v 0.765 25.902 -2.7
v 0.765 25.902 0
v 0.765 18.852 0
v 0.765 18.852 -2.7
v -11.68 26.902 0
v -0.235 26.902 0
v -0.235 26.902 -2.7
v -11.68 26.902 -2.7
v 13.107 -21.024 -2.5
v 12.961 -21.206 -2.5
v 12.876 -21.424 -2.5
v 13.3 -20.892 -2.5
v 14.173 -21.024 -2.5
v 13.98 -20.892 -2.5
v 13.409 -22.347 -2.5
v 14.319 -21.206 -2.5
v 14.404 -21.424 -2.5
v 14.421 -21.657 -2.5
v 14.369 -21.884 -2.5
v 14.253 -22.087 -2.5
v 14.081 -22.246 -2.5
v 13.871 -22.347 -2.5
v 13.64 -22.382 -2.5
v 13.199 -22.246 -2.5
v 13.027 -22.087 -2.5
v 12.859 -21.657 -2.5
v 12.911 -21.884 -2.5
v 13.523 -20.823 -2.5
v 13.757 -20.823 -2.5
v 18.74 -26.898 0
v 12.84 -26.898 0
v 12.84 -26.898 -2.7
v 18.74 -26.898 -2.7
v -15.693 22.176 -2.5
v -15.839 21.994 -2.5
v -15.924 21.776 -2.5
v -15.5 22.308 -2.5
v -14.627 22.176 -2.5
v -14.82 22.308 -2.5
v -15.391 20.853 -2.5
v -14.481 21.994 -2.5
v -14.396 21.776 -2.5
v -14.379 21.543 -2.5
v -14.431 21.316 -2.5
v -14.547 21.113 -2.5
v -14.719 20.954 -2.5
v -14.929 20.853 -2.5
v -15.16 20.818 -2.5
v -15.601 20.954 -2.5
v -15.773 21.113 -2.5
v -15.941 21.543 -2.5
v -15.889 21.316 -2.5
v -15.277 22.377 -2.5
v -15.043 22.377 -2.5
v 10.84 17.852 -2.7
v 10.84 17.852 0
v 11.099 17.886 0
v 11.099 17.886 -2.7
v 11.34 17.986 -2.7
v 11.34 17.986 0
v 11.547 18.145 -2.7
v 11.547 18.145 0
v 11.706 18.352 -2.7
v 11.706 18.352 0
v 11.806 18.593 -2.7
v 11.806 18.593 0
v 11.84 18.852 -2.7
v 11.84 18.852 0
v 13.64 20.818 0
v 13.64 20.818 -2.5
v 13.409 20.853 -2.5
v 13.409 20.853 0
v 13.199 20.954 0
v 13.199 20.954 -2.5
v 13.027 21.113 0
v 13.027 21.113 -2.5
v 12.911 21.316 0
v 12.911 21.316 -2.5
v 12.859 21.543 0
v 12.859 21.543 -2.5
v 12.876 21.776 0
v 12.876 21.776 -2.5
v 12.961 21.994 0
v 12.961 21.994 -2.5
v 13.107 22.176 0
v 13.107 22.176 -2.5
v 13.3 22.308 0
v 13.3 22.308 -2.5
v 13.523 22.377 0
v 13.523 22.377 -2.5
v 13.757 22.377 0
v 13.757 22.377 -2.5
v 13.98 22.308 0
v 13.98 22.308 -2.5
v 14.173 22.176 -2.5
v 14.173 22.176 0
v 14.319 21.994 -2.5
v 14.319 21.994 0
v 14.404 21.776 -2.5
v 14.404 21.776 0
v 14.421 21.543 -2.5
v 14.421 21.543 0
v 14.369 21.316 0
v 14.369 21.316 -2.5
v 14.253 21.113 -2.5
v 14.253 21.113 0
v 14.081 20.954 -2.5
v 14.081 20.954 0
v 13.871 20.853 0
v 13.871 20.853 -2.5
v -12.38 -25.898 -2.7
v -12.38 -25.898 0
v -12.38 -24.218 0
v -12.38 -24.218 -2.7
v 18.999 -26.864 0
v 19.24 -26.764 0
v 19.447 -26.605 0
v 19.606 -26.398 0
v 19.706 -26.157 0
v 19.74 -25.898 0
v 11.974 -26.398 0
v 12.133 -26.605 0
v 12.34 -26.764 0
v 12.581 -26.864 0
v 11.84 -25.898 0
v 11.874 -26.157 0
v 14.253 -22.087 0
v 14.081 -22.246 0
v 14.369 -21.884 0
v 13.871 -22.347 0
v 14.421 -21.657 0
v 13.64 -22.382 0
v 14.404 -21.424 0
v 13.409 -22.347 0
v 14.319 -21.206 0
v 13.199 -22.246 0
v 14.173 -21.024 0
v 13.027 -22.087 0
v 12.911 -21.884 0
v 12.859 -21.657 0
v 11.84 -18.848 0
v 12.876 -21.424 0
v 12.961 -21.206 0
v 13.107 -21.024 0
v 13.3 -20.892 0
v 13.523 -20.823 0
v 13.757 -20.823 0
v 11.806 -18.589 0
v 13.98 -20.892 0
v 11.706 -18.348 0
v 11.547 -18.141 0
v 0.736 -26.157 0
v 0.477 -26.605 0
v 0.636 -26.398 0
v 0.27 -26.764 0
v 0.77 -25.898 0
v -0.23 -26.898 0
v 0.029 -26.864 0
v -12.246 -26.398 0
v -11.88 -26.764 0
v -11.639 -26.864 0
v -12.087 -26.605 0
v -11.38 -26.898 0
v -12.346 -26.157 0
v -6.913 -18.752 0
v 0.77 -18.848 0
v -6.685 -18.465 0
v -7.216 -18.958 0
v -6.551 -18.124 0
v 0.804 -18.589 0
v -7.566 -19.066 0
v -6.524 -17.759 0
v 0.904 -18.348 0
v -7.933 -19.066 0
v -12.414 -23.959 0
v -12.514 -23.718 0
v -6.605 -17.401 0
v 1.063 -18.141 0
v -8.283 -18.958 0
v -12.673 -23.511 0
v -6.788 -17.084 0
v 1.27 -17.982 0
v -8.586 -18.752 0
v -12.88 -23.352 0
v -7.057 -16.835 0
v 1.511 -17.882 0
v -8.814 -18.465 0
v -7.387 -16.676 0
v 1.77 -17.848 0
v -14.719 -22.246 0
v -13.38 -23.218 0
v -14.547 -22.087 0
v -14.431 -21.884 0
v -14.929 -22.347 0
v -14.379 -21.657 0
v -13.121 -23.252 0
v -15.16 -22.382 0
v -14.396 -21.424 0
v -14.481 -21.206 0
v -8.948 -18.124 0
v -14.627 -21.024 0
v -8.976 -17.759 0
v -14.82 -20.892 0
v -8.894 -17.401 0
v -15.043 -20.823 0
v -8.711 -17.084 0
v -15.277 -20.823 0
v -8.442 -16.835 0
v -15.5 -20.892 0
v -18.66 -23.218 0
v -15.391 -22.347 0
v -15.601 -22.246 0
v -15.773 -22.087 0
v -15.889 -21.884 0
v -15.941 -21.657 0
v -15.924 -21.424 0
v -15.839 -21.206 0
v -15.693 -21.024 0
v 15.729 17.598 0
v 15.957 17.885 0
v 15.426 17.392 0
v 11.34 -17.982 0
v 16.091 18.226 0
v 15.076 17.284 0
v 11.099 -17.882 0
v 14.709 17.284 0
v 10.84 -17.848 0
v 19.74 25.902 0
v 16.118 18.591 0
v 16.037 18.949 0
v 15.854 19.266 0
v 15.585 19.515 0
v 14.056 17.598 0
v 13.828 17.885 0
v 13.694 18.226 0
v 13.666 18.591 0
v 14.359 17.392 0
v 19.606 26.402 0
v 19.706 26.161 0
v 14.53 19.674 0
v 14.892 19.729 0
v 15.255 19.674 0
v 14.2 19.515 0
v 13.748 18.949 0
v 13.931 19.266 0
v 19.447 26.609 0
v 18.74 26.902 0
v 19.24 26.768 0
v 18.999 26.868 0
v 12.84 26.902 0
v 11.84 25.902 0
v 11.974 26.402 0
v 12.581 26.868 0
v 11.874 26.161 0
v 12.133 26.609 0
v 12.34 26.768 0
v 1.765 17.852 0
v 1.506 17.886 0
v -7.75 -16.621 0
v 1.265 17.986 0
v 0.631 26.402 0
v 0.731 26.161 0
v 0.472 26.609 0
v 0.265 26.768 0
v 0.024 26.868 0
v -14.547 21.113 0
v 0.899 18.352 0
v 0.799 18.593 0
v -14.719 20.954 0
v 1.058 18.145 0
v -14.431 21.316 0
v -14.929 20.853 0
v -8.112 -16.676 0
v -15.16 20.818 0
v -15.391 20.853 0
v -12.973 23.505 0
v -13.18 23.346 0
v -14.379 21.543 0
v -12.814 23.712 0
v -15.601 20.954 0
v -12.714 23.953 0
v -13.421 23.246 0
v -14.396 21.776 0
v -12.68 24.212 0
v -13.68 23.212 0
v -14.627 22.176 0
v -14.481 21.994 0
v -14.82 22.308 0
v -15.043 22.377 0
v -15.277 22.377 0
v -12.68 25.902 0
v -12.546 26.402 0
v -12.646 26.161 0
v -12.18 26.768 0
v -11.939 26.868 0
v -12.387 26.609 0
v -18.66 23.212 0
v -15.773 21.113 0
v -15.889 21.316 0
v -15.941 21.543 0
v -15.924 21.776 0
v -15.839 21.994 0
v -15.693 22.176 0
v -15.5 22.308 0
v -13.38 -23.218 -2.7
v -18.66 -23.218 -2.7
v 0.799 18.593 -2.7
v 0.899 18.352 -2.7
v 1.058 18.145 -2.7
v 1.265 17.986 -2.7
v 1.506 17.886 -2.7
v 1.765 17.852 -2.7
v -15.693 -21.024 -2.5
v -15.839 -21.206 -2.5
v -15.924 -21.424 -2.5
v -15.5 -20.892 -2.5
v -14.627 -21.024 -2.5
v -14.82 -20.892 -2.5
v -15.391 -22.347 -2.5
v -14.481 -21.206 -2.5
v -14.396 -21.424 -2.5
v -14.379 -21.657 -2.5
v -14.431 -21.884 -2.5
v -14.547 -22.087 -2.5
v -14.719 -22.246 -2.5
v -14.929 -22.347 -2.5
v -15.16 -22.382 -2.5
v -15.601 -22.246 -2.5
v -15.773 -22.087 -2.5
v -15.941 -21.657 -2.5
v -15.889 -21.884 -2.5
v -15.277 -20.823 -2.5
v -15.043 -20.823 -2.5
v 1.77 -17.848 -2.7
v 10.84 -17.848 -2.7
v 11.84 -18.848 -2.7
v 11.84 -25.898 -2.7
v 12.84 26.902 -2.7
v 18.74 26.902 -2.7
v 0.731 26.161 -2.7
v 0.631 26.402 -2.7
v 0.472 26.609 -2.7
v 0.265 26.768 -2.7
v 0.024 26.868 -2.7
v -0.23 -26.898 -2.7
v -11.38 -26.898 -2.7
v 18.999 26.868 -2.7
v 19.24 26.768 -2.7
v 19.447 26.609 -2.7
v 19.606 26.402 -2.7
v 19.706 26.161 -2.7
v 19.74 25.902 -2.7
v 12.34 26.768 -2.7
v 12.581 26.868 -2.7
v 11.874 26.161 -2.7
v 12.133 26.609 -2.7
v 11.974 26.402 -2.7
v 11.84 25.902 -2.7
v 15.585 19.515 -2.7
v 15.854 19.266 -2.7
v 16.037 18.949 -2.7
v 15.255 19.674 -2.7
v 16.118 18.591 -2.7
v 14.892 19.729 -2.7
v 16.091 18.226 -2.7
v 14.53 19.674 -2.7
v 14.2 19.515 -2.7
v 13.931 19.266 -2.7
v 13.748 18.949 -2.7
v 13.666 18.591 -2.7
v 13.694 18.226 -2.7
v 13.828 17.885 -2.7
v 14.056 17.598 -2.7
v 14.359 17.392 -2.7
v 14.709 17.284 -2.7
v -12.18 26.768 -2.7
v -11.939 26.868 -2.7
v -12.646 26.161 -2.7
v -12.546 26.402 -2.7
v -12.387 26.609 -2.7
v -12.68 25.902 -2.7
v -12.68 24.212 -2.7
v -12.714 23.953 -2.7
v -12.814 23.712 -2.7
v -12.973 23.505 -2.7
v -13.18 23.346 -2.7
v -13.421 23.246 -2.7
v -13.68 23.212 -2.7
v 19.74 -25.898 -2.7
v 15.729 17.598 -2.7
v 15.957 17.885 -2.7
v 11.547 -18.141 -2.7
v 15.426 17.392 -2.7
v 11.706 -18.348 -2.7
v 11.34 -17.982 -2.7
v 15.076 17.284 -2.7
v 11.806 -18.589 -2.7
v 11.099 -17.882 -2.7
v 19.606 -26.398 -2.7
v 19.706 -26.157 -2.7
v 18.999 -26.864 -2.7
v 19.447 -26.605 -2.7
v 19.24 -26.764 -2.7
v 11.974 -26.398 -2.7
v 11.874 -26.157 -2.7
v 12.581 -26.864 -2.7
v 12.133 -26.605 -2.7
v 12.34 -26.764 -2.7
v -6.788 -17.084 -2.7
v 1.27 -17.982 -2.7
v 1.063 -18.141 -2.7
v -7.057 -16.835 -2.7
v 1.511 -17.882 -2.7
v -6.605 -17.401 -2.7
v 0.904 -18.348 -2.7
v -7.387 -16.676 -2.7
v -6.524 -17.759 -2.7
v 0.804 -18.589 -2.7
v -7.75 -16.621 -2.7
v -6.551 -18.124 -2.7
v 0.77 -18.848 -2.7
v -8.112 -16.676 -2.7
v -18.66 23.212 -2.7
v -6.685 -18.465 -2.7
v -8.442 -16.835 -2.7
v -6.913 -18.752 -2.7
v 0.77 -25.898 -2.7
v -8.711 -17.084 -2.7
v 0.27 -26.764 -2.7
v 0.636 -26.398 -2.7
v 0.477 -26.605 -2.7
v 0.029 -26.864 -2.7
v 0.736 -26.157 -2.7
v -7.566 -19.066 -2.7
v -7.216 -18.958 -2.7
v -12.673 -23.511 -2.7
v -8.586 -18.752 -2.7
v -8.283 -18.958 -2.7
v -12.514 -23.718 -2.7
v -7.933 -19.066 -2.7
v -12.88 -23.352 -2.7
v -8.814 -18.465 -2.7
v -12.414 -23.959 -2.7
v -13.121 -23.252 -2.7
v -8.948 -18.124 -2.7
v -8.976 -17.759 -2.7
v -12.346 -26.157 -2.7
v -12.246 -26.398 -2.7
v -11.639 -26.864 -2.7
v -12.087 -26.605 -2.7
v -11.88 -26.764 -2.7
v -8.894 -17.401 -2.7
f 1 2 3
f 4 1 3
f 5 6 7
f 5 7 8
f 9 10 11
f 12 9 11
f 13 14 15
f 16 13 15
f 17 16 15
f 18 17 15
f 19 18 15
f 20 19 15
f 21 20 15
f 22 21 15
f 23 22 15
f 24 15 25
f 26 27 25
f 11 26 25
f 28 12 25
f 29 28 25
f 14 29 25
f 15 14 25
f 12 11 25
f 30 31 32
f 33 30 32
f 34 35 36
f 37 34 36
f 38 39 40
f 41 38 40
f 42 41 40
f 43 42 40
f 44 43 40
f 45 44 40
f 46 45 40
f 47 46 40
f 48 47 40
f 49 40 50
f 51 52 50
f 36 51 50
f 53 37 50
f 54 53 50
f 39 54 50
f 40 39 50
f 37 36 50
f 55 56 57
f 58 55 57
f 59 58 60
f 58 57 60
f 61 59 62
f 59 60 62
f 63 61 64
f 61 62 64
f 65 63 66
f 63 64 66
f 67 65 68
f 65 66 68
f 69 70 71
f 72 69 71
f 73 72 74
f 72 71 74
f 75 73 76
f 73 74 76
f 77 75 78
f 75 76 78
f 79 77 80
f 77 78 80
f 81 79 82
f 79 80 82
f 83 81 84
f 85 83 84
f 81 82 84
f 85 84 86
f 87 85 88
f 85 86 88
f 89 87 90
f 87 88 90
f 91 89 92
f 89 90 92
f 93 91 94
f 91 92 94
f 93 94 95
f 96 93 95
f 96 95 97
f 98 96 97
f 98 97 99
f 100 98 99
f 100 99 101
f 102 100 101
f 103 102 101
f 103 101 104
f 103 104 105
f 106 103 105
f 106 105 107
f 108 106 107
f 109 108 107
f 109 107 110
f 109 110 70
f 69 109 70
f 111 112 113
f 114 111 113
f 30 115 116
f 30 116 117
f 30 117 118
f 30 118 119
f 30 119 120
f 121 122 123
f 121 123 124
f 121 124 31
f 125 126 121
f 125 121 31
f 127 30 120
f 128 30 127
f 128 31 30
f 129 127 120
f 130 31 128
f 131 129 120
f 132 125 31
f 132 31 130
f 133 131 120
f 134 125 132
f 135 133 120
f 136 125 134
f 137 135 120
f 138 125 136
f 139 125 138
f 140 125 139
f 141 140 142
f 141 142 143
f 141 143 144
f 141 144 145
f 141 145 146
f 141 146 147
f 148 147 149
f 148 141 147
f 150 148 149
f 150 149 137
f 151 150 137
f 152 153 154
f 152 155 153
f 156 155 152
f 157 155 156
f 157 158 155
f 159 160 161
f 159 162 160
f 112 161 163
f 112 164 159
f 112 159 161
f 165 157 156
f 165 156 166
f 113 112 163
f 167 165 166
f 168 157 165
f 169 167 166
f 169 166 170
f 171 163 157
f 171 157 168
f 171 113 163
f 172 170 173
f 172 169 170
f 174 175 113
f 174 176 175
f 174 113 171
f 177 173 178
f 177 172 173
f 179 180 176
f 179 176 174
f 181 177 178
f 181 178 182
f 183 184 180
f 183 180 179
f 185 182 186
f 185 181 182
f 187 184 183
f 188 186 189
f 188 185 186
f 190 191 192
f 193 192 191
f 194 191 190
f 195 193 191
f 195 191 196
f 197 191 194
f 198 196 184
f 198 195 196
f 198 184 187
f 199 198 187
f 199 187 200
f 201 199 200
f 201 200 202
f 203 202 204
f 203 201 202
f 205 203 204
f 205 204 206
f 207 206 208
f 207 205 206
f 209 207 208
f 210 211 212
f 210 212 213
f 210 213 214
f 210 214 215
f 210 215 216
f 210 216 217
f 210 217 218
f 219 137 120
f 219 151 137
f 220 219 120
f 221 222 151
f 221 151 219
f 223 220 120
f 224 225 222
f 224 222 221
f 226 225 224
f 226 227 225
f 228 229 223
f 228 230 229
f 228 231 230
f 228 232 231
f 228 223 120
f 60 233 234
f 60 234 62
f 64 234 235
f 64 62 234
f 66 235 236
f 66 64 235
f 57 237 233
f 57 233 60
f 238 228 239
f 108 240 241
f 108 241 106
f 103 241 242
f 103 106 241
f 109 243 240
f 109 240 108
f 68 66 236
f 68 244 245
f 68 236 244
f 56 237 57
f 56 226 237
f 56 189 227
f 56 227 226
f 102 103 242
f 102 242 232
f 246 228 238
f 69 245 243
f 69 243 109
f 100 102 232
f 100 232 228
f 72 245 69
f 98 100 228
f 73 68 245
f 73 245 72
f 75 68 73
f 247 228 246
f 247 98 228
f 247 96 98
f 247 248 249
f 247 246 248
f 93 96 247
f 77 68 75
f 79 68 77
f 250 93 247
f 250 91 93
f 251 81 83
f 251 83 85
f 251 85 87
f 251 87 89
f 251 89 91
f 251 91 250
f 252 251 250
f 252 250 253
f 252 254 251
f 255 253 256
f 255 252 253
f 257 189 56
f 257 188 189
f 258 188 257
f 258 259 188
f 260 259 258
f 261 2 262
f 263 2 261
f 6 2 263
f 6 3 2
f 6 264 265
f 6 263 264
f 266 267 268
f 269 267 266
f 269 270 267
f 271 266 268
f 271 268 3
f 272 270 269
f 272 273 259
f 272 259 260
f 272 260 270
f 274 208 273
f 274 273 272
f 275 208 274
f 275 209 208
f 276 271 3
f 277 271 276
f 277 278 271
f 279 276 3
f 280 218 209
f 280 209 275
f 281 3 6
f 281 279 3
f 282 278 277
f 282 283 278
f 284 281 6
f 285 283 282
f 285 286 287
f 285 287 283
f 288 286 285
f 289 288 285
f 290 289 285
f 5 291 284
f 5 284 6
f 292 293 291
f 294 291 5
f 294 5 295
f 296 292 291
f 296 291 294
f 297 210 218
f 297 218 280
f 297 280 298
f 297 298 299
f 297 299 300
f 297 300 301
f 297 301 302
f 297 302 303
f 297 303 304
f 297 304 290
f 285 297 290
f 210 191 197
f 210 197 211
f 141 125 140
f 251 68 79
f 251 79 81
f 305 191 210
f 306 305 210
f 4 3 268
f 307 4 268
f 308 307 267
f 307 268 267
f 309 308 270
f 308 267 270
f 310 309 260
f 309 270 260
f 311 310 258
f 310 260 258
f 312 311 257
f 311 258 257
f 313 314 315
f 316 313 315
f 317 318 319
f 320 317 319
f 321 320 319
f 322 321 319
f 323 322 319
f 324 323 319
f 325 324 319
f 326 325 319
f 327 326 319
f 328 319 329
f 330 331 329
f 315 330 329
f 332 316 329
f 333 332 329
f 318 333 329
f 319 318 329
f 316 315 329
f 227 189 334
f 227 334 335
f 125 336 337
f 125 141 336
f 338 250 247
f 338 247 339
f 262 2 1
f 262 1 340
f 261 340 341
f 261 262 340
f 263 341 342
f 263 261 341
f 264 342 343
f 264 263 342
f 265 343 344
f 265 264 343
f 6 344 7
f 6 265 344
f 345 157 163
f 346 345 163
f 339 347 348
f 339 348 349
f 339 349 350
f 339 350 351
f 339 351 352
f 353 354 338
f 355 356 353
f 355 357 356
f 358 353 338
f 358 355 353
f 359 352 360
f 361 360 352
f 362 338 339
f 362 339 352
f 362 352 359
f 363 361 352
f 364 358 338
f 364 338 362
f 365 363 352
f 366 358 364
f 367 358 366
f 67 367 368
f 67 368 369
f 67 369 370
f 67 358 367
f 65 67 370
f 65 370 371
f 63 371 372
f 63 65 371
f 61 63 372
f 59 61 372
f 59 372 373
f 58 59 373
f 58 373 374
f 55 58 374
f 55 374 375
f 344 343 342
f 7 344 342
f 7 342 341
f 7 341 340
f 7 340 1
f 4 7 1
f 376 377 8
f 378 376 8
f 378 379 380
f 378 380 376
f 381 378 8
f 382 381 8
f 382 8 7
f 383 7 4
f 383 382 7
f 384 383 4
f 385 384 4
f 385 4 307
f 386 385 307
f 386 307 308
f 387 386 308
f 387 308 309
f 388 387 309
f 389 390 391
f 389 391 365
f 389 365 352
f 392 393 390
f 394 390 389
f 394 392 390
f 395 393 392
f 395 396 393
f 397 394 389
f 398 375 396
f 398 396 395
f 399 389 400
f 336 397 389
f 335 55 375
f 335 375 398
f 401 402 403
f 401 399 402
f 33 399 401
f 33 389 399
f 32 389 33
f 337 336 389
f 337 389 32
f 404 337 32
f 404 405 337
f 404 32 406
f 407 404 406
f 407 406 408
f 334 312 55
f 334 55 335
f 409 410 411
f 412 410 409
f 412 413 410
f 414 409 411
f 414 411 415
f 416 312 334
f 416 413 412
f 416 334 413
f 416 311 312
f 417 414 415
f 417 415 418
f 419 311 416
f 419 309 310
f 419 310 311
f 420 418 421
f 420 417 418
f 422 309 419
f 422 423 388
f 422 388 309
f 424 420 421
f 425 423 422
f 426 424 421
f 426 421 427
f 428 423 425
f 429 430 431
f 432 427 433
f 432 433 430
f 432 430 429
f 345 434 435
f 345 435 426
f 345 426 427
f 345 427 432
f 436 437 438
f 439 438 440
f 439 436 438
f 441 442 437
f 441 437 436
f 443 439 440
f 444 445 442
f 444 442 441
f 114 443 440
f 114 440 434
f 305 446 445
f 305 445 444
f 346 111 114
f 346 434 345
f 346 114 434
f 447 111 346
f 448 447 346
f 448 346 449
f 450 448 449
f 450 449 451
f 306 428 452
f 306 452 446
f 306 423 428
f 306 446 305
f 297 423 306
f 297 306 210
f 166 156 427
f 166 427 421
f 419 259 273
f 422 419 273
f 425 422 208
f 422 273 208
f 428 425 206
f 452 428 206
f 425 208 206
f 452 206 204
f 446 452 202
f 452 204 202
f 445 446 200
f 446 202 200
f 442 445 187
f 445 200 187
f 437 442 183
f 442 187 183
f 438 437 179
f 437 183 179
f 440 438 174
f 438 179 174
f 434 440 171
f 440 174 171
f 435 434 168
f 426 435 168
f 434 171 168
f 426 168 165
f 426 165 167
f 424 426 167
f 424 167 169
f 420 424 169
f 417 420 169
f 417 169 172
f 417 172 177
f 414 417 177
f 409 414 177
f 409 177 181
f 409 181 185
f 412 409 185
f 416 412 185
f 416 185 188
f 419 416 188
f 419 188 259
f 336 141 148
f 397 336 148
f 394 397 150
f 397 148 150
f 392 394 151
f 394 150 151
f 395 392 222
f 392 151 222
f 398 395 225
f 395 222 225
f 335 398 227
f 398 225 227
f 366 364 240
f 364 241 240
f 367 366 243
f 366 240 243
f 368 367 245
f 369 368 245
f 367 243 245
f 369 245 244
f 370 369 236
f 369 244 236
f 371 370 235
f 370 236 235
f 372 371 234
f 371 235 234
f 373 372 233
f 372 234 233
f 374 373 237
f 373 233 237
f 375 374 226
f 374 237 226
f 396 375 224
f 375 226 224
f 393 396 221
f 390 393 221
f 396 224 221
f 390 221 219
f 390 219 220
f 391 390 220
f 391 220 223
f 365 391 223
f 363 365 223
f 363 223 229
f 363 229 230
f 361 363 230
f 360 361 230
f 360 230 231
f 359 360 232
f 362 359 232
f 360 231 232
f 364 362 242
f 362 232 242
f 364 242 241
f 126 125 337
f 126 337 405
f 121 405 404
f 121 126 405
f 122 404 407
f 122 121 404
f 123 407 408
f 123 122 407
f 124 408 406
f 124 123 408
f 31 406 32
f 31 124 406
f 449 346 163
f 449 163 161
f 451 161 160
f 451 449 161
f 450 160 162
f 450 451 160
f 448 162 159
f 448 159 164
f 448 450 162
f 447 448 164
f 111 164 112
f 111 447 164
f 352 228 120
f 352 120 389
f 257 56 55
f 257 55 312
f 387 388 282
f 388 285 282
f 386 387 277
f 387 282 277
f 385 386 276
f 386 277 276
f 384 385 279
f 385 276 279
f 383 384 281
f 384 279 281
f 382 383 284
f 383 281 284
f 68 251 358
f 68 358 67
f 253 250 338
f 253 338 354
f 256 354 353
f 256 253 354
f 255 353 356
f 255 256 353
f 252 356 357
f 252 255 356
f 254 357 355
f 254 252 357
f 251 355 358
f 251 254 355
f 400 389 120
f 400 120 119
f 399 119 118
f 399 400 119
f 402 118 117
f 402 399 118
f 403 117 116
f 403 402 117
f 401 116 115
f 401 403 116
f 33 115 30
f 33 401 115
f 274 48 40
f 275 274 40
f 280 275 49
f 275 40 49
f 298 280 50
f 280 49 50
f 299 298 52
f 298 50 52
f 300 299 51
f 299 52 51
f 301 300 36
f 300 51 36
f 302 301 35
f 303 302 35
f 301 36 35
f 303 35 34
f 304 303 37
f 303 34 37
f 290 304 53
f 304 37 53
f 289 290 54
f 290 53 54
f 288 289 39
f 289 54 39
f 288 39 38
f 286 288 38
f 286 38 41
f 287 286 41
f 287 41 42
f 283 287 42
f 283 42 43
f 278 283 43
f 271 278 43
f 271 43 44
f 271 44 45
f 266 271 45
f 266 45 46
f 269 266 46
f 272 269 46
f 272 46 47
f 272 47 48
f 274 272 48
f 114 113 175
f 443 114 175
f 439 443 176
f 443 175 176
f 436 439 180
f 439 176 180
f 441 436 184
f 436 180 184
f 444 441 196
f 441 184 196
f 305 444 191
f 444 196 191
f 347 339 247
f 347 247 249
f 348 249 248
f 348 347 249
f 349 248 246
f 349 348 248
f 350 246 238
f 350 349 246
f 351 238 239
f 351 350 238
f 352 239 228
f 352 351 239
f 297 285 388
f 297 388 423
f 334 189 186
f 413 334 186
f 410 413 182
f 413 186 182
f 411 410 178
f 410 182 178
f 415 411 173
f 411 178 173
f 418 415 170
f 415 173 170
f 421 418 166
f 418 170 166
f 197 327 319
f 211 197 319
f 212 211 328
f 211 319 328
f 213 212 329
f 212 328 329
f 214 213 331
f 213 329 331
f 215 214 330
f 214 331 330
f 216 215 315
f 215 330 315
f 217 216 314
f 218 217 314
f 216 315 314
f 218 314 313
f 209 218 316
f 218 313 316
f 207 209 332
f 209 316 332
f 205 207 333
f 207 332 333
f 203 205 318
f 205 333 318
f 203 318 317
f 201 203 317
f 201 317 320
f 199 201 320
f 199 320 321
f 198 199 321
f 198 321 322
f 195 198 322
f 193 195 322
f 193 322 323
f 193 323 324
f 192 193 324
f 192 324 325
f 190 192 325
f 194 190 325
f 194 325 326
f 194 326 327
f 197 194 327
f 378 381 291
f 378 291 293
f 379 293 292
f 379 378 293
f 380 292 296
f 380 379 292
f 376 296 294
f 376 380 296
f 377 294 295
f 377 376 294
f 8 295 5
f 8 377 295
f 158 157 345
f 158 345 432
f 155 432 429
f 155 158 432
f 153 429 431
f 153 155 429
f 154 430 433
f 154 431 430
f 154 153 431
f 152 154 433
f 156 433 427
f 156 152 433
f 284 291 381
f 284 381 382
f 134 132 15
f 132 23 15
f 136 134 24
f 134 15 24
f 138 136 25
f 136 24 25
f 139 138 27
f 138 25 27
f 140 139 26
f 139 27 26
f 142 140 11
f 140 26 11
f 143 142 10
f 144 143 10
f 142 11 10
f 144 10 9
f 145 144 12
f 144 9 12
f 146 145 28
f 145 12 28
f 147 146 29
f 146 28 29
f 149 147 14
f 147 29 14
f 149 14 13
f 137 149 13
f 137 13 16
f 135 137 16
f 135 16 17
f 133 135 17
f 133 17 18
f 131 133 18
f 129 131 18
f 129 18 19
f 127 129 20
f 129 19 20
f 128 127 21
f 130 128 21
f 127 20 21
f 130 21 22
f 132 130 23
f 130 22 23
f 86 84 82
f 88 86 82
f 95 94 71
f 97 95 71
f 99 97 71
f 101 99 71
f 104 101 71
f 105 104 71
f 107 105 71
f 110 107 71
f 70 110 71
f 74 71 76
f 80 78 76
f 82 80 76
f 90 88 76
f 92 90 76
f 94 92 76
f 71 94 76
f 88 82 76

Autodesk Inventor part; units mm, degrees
ref_plane "YZ Plane" through (0, 0, 0) normal (1, 0, 0) x (0, 1, 0)
ref_plane "XZ Plane" through (0, 0, 0) normal (0, 1, 0) x (-1, 0, 0)
ref_plane "XY Plane" through (0, 0, 0) normal (0, 0, 1) x (1, 0, 0)
sketch "Sketch1" plane through (0, 0, 0) normal (0, 0, 1) x (1, 0, 0)
  line L0 (10.66, -31.5) -> (10.66, -19.9) construction
  line L1 (10.66, -31.5) -> (20, -31.5) construction
  line L2 (20, -31.5) -> (20, 31.5) construction
  line L3 (10.66, 31.5) -> (20, 31.5) construction
  line L4 (10.66, 19.9) -> (10.66, 31.5) construction
  arc A0 (9.66, 18.9) -> (10.66, 19.9) centre (9.66, 19.9) ccw construction
  line L5 (2.06, 18.9) -> (9.66, 18.9) construction
  arc A1 (1.06, 19.9) -> (2.06, 18.9) centre (2.06, 19.9) ccw construction
  line L6 (1.06, 31.5) -> (1.06, 19.9) construction
  line L7 (-20, 31.5) -> (1.06, 31.5) construction
  line L8 (-20, 31.5) -> (-20, -31.5) construction
  line L9 (-20, -31.5) -> (1.06, -31.5) construction
  line L10 (1.06, -19.9) -> (1.06, -31.5) construction
  arc A2 (2.06, -18.9) -> (1.06, -19.9) centre (2.06, -19.9) ccw construction
  line L11 (9.66, -18.9) -> (2.06, -18.9) construction
  arc A3 (10.66, -19.9) -> (9.66, -18.9) centre (9.66, -19.9) ccw construction
  line L12 (17.245, 17.9) -> (-18.765, 17.9) construction
  line L13 (17.245, -17.9) -> (17.245, 17.9) construction
  line L14 (-18.765, -17.9) -> (17.245, -17.9) construction
  line L15 (-18.765, 17.9) -> (-18.765, -17.9) construction
  circle A4 centre (0.9382, -13.2582) radius 1 construction
  circle A5 centre (-15.16, -21.5982) radius 1 construction
  circle A6 centre (-15.16, 21.6018) radius 1 construction
  circle A7 centre (13.64, 21.6018) radius 1 construction
  line L16 (10.84, 17.8518) -> (1.765, 17.8518)
  arc A8 (0.765, 18.8518) -> (1.765, 17.8518) centre (1.765, 18.8518) ccw
  line L17 (0.765, 26.467) -> (0.765, 18.8518)
  arc A9 (0.765, 26.467) -> (-0.06, 26.9018) centre (-0.06, 25.9018) ccw
  line L18 (-0.06, 26.9018) -> (-12.68, 26.9018)
  line L19 (-12.68, 26.9018) -> (-12.68, 24.2118)
  arc A10 (-13.68, 23.2118) -> (-12.68, 24.2118) centre (-13.68, 24.2118) ccw
  line L20 (-17.78, 23.2118) -> (-13.68, 23.2118)
  arc A11 (-18.78, 24.2118) -> (-17.78, 23.2118) centre (-17.78, 24.2118) ccw
  line L21 (-18.78, 26.9018) -> (-18.78, 24.2118)
  line L22 (-18.78, 26.9018) -> (-20.66, 26.9018)
  line L23 (-20.66, 26.9018) -> (-20.66, -26.8982)
  line L24 (-18.55, -26.8982) -> (-20.66, -26.8982)
  line L25 (-18.55, -26.8982) -> (-18.55, -24.2182)
  arc A12 (-17.55, -23.2182) -> (-18.55, -24.2182) centre (-17.55, -24.2182) ccw
  line L26 (-13.38, -23.2182) -> (-17.55, -23.2182)
  arc A13 (-12.38, -24.2182) -> (-13.38, -23.2182) centre (-13.38, -24.2182) ccw
  line L27 (-12.38, -26.8982) -> (-12.38, -24.2182)
  line L28 (-0.06, -26.8982) -> (-12.38, -26.8982)
  arc A14 (-0.06, -26.8982) -> (0.77, -26.4559) centre (-0.06, -25.8982) ccw
  line L29 (0.77, -26.4559) -> (0.77, -18.8482)
  arc A15 (1.77, -17.8482) -> (0.77, -18.8482) centre (1.77, -18.8482) ccw
  line L30 (1.77, -17.8482) -> (10.84, -17.8482)
  arc A16 (11.84, -18.8482) -> (10.84, -17.8482) centre (10.84, -18.8482) ccw
  line L31 (11.84, -18.8482) -> (11.84, -25.8982)
  arc A17 (11.84, -25.8982) -> (12.84, -26.8982) centre (12.84, -25.8982) ccw
  line L32 (17.74, -26.8982) -> (12.84, -26.8982)
  line L33 (17.74, -26.8982) -> (17.74, 26.9018)
  line L34 (17.74, 26.9018) -> (12.84, 26.9018)
  arc A18 (12.84, 26.9018) -> (11.84, 25.9018) centre (12.84, 25.9018) ccw
  line L35 (11.84, 25.9018) -> (11.84, 18.8518)
  arc A19 (10.84, 17.8518) -> (11.84, 18.8518) centre (10.84, 18.8518) ccw
  circle A20 centre (-15.16, 21.6018) radius 1
  circle A21 centre (-15.16, -21.5982) radius 1
  circle A22 centre (13.64, -21.5982) radius 1
  circle A23 centre (13.64, 21.6018) radius 1
  line L36 (-20.66, 0.0018) -> (17.74, 0.0018) construction
  line L37 (-1.46, 0.0018) -> (-1.46, -26.8982) construction
  line L38 (-20, 0) -> (20, 0) construction
  point P0 (-20.66, -26.8983)
  point P1 (17.64, 32.8018)
  dimension "d2" = 40
  dimension "d3" = 63
extrude "Extrusion1" add sketch "Sketch1" against normal blind 2.7 contours A19 L35 A18 L34 L33 L32 A17 L31 A16 L30 A15 L29 A14 L28 L27 A13 L26 A12 L25 L24 L23 L22 L21 A11 L20 A10 L19 L18 A9 L17 A8 L16 | A20 | A21 | A22 | A23
hole "Hole1" at (-15.16, -21.5982, 0) at (-15.16, 21.6018, 0) at (13.64, 21.6018, 0) at (13.64, -21.5982, 0) at (13.64, 21.6018, 0) at (-15.16, 21.6018, 0) at (-15.16, -21.5982, 0) direction (0, 0, -1) diameter 1.567 depth 2.5 thread size "M2x0.4" class "6H" standard "ISO Metric profile"
sketch "Sketch2" plane through (0, 0, -2.7) normal (0, 0, -1) x (-1, 0, 0)
  circle A0 centre (-14.8923, 18.4994) radius 1.6002 projected
  circle A1 centre (7.7497, -17.8506) radius 1.6002 projected
  line L0 (-14.8923, 18.4994) -> (7.7497, 18.4994)
  line L1 (7.7497, 18.4994) -> (7.7497, -17.8506)
  line L2 (7.7497, -17.8506) -> (-14.8923, -17.8506)
  line L3 (-14.8923, -17.8506) -> (-14.8923, 18.4994)
hole "Hole2" at (-7.7497, -17.8506, -2.7) at (14.8923, 18.4994, -2.7) direction (0, 0, 1) diameter 2.459 end through all thread size "M3x0.5" class "6H" standard "ISO Metric profile"
sketch "Sketch4" plane through (0, 0, 0) normal (0, 0, 1) x (1, 0, 0)
  line L0 (-20.66, 26.9018) -> (-18.78, 26.9018) projected
  line L1 (-17.78, 23.2118) -> (-20.66, 23.2118)
  line L2 (-20.66, 23.2118) -> (-20.66, 26.9018)
  line L3 (-20.66, 26.9018) -> (-17.78, 26.9018)
  line L4 (-17.78, 26.9018) -> (-17.78, 23.2118)
  line L5 (-18.55, -26.8982) -> (-20.66, -26.8982) projected
  line L6 (-17.55, -23.2182) -> (-20.66, -23.2182)
  line L7 (-20.66, -23.2182) -> (-20.66, -26.8982)
  line L8 (-20.66, -26.8982) -> (-17.55, -26.8982)
  line L9 (-17.55, -26.8982) -> (-17.55, -23.2182)
  point P0 (0, 0)
extrude "Extrusion4" cut sketch "Sketch4" against normal blind 10
sketch "Sketch5" plane through (-20.66, -23.2182, 0) normal (-1, 0, 0) x (0, 0, 1)
  line L0 (0, 46.43) -> (-2.7, 46.43) projected
  line L1 (-2.7, 0) -> (-2.7, 46.43) projected
  line L2 (-2.7, 0) -> (0, 0) projected
  line L3 (0, 46.43) -> (0, 0) projected
  point P0 (0, 23.2182)
extrude "Extrusion5" cut sketch "Sketch5" against normal blind 2
sketch "Sketch6" plane through (17.74, -26.8982, 0) normal (1, 0, 0) x (0, 0, -1)
  line L0 (0, 0) -> (0, 53.8) projected
  line L1 (0, 0) -> (2.7, 0) projected
  line L2 (2.7, 53.8) -> (2.7, 0) projected
  line L3 (0, 53.8) -> (2.7, 53.8) projected
  point P0 (0, 26.8982)
extrude "Extrusion6" add sketch "Sketch6" along normal blind 2
sketch "Sketch7" plane through (0, 0, -2.7) normal (0, 0, -1) x (-1, 0, 0)
  arc A0 (-0.77, -26.4559) -> (0.06, -26.8982) centre (0.06, -25.8982) ccw projected
  line L0 (-0.77, -26.4559) -> (0.06, -26.4559)
  line L1 (0.06, -26.4559) -> (0.06, -26.8982)
  line L2 (0.06, -26.8982) -> (-0.77, -26.8982)
  line L3 (-0.77, -26.8982) -> (-0.77, -26.4559)
  arc A1 (0.06, 26.9018) -> (-0.765, 26.467) centre (0.06, 25.9018) ccw projected
  line L4 (0.06, 26.9018) -> (-0.765, 26.9018)
  line L5 (-0.765, 26.9018) -> (-0.765, 26.467)
  line L6 (-0.765, 26.467) -> (0.06, 26.467)
  line L7 (0.06, 26.467) -> (0.06, 26.9018)
  point P0 (0, 0)
extrude "Extrusion7" add sketch "Sketch7" against normal up to surface (2.7 mm away)
fillet "Fillet3" radius 1 6 edges at (-12.38, -26.8982, -1.35) (19.74, -26.8982, -1.35) (19.74, 26.9018, -1.35) (-12.68, 26.9018, -1.35) (0.765, 26.9018, -1.35) (0.77, -26.8982, -1.35)
properties part number "3d_LM - chapa" material "Aluminium 6061-T6"
